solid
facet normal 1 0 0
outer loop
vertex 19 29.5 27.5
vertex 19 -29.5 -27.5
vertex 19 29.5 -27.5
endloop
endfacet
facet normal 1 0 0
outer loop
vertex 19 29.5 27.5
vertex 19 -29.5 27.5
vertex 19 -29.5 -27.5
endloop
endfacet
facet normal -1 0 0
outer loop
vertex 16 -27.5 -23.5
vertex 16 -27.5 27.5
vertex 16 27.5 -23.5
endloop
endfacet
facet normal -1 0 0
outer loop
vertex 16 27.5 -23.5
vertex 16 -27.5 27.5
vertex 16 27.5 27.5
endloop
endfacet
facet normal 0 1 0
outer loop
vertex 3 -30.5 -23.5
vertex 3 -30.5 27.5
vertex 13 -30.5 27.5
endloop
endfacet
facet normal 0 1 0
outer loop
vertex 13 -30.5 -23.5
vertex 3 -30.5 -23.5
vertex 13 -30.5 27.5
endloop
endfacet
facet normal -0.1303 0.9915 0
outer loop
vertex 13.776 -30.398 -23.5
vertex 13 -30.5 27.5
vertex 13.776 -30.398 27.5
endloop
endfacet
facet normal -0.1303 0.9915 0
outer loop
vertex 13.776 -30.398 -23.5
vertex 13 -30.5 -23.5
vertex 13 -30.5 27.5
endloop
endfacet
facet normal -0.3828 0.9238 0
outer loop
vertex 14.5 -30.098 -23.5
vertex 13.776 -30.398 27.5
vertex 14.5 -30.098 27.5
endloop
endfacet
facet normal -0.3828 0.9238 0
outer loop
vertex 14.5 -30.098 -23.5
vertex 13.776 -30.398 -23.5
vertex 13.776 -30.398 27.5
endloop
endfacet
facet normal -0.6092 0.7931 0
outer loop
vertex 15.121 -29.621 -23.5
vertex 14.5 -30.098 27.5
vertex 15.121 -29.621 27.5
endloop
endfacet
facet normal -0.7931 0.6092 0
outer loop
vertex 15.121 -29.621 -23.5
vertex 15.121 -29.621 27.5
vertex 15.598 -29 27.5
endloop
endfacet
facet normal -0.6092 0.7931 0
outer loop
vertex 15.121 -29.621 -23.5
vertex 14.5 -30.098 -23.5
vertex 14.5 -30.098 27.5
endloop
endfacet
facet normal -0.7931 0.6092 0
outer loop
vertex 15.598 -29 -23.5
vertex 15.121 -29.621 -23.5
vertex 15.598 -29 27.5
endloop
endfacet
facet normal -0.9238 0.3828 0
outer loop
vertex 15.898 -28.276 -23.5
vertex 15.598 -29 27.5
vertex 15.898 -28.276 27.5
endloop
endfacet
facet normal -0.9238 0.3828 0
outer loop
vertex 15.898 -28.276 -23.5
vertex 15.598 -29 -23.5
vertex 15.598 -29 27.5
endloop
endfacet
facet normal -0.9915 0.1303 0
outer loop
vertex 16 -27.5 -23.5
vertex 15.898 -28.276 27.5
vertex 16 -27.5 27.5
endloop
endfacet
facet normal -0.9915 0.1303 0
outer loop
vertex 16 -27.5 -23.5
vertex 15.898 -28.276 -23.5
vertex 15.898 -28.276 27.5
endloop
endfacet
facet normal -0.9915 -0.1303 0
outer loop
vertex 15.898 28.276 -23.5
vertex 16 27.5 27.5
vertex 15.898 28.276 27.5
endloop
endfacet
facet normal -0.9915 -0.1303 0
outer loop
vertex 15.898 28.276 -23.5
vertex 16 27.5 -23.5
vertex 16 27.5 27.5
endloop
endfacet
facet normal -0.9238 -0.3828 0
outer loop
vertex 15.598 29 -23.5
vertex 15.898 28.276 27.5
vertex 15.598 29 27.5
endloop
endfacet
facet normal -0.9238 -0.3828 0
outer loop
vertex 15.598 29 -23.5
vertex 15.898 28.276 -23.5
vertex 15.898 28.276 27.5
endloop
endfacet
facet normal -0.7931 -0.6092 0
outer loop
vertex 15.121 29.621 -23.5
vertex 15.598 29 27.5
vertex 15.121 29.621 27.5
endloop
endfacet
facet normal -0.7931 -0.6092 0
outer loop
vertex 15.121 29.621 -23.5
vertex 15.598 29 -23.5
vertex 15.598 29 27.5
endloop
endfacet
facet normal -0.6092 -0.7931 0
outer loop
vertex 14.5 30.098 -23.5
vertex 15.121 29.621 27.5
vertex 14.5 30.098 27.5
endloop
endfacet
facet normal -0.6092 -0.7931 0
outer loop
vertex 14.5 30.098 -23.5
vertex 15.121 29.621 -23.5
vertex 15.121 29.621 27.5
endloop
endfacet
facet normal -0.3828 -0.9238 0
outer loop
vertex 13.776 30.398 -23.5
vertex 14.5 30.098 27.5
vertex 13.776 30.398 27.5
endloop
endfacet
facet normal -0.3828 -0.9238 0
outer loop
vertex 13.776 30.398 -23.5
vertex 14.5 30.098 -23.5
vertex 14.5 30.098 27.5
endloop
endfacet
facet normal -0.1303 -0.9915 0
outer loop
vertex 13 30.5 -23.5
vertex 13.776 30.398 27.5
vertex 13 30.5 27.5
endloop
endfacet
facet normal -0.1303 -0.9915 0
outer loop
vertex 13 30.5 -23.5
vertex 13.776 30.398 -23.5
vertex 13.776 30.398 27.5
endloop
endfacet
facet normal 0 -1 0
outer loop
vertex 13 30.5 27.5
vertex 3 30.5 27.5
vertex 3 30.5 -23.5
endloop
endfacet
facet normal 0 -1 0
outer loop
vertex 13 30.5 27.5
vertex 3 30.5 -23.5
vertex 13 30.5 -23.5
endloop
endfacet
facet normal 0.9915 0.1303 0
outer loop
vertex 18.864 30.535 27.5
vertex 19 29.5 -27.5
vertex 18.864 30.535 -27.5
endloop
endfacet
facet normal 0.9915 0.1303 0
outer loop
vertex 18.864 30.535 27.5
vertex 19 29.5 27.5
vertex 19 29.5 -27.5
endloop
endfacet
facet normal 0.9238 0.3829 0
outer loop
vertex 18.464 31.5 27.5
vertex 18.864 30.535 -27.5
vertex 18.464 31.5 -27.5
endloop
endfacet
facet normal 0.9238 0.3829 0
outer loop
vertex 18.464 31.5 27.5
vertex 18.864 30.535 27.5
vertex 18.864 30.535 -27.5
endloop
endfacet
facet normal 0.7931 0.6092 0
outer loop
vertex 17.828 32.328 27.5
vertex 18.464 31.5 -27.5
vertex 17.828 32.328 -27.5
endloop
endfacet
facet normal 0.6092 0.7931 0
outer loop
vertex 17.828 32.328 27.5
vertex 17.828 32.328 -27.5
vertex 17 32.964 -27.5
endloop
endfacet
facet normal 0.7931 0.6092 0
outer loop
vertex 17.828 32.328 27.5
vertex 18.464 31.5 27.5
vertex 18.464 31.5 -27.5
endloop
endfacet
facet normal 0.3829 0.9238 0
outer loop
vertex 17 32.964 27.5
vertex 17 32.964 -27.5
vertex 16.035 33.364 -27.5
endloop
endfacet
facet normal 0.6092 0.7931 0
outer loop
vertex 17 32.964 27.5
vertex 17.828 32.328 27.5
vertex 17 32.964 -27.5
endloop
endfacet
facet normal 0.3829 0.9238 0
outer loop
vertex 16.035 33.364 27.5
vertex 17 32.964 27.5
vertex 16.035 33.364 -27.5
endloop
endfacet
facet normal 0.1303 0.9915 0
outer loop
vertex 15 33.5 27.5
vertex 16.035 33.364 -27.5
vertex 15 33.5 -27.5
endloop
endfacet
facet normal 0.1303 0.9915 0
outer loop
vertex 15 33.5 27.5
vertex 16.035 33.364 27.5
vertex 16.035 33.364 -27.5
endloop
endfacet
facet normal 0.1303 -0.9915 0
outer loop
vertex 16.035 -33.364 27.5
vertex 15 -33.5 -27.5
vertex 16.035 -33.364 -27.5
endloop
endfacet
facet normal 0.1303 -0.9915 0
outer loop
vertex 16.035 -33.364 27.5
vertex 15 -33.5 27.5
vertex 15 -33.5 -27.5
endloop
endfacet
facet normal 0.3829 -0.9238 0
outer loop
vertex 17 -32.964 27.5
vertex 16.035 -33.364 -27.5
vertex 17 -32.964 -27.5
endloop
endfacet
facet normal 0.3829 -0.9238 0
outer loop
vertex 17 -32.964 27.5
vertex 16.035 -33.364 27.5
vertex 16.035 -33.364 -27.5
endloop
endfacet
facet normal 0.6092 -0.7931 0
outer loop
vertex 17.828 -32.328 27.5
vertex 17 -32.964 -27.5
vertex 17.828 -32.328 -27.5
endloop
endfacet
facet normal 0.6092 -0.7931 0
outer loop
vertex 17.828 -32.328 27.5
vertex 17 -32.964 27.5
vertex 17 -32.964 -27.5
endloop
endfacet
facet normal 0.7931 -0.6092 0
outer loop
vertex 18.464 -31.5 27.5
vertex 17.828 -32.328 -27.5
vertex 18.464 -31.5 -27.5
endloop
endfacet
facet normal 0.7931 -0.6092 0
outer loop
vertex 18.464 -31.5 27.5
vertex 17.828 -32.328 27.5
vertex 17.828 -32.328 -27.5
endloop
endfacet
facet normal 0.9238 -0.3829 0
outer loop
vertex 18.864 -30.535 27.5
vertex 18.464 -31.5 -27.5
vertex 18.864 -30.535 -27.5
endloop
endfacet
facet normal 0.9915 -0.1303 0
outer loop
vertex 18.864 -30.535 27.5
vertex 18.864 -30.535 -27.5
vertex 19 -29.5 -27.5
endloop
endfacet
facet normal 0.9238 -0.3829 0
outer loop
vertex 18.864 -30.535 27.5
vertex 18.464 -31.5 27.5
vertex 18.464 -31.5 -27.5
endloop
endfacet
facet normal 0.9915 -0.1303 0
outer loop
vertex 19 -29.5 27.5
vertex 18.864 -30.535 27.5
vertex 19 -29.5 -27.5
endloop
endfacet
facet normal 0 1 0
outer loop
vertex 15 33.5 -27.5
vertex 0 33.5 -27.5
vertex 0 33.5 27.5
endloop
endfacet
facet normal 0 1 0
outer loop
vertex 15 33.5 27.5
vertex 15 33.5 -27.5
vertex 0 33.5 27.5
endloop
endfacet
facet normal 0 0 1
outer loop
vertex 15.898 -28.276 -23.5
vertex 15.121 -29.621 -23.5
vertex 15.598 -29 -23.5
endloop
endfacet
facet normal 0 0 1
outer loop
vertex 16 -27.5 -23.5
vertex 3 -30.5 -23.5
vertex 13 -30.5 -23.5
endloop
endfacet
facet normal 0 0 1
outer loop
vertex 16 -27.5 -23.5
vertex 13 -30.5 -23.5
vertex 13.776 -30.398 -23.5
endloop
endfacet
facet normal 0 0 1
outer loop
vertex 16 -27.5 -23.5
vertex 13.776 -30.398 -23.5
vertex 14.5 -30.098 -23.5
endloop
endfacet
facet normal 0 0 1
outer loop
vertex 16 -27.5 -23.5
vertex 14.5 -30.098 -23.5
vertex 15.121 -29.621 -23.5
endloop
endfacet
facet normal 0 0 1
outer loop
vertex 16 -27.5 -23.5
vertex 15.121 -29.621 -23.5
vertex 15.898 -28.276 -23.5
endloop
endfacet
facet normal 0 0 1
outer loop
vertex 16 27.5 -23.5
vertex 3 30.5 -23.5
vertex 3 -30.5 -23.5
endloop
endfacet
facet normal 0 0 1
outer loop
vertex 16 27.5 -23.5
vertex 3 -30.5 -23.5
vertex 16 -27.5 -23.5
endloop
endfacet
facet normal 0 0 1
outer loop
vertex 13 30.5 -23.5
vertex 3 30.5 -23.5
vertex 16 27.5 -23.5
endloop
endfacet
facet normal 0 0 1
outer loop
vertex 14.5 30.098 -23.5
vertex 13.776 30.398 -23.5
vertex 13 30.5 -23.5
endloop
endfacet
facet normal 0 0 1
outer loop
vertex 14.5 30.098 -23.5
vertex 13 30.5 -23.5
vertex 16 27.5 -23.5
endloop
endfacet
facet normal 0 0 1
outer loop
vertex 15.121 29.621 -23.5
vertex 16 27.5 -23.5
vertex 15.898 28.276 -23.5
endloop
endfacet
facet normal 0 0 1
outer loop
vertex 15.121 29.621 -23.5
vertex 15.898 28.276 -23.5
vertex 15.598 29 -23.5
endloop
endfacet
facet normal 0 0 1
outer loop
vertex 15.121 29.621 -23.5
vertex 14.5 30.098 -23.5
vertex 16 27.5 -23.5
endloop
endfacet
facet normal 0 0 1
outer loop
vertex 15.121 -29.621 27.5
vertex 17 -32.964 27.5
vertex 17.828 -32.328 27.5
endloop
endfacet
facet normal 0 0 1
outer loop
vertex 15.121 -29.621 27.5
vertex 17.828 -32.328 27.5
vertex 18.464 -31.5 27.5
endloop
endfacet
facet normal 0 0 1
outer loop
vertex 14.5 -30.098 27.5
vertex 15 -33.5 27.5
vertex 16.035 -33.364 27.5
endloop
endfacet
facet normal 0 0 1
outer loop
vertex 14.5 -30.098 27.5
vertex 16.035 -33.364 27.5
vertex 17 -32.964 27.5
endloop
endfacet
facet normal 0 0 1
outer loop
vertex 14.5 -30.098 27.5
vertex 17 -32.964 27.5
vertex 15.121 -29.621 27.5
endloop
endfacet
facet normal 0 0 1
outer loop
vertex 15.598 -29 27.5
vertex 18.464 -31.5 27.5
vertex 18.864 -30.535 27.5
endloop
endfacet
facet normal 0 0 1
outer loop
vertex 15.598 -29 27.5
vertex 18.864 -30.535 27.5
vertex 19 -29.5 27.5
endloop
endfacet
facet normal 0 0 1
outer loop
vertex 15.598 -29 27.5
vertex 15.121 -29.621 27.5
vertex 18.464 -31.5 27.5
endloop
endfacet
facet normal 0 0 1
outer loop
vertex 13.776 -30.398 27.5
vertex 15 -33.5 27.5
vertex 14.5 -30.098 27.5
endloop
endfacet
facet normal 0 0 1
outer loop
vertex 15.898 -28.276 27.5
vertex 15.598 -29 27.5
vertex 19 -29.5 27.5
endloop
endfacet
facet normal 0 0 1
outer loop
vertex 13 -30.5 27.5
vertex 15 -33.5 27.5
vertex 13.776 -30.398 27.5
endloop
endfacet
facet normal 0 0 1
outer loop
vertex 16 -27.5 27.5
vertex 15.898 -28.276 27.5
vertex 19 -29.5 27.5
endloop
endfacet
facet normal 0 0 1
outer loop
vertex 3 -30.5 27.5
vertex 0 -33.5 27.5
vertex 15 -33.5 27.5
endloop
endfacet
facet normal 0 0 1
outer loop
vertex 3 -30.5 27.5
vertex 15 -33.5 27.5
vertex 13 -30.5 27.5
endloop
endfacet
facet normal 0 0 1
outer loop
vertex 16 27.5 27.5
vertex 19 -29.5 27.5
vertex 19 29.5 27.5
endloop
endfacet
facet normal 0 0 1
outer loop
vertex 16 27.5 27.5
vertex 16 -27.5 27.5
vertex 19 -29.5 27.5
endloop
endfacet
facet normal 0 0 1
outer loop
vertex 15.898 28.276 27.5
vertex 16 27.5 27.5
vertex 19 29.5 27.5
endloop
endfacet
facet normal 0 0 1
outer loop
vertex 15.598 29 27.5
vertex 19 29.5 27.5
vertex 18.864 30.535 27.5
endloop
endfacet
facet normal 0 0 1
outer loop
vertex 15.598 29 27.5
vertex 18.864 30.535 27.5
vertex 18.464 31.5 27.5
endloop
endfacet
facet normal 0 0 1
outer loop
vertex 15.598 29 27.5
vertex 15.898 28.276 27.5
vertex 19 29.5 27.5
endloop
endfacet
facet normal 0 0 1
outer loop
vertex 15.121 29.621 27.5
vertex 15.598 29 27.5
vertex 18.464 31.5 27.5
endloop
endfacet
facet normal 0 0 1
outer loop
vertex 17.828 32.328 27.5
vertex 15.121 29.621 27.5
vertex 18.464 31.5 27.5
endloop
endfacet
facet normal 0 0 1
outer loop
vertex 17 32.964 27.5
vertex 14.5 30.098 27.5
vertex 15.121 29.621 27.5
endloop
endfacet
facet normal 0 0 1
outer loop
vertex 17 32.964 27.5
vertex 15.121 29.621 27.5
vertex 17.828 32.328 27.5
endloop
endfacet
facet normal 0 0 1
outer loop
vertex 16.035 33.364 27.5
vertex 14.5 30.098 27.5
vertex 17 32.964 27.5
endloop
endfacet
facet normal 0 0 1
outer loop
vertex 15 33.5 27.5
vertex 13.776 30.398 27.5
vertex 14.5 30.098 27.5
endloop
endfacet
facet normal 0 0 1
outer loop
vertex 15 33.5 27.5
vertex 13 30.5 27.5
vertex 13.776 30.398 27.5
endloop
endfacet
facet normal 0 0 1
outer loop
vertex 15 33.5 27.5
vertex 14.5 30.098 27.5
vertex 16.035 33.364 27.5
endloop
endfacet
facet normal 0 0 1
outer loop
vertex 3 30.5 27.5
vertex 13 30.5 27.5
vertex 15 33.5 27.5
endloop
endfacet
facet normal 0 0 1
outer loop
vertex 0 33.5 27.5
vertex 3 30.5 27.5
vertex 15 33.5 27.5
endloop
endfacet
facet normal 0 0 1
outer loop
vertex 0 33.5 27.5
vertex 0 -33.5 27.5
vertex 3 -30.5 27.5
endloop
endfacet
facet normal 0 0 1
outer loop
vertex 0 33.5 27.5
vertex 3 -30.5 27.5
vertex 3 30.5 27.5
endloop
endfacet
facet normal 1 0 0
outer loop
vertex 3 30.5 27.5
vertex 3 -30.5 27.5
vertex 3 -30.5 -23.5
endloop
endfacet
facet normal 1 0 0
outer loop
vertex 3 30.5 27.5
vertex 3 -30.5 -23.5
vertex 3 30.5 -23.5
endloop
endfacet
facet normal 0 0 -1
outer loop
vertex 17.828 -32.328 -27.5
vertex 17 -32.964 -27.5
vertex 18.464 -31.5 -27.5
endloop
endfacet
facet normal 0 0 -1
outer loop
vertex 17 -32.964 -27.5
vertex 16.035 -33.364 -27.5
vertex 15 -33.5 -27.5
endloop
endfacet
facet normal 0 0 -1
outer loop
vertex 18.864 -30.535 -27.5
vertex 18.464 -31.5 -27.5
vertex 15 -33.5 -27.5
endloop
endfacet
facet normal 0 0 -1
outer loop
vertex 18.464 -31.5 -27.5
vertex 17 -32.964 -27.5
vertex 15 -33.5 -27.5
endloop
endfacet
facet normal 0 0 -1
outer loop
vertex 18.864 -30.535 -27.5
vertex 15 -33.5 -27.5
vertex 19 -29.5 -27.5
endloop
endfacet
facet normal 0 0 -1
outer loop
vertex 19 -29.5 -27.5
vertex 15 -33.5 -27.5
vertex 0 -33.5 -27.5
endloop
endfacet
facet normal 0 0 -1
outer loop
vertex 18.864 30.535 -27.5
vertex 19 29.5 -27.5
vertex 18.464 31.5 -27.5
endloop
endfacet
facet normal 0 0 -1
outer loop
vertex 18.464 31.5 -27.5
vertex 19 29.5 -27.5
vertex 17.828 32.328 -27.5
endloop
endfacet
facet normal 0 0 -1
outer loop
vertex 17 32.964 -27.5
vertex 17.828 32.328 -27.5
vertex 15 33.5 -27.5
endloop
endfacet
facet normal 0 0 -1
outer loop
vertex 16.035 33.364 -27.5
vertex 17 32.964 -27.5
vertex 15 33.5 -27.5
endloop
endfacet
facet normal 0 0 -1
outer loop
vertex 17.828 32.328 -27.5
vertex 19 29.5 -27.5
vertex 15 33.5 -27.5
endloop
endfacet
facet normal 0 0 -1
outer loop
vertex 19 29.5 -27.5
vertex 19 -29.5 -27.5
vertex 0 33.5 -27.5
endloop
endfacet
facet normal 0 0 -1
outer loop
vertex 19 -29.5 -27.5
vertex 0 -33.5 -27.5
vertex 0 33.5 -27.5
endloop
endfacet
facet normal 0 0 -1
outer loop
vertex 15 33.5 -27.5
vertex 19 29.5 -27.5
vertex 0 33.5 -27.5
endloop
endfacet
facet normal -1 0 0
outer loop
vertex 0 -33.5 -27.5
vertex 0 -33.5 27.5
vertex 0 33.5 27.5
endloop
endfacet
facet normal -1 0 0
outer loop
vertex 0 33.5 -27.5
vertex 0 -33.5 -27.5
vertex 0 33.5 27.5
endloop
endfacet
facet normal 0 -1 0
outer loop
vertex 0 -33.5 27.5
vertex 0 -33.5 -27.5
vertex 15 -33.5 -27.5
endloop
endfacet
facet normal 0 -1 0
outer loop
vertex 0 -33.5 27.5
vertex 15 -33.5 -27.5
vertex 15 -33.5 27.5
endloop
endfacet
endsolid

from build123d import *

# Parameters (mm, degrees)
SKETCH1_W           = 67
SKETCH1_H           = 55
BOSS_EXTRUDE1_DEPTH = 19
SKETCH3_W           = 13
SKETCH3_H           = 61
CUT_EXTRUDE1_DEPTH  = 51
FILLET1_R           = 4
FILLET2_R           = 3


with BuildPart() as part:
    # Sketch1 → Boss-Extrude1 (new body)
    with BuildSketch(Plane.YZ):
        Rectangle(SKETCH1_W, SKETCH1_H)
    extrude(amount=BOSS_EXTRUDE1_DEPTH)

    # Sketch3 → Cut-Extrude1 (cut)
    with BuildSketch(Plane.XY.offset(27.5)):
        with Locations((9.5, 0)):
            Rectangle(SKETCH3_W, SKETCH3_H)
    extrude(amount=-CUT_EXTRUDE1_DEPTH, mode=Mode.SUBTRACT)

    # Fillet1
    fillet1_edges = [part.edges().sort_by_distance(p)[0] for p in [
        (19, -33.5, 0),
        (19, 33.5, 0),
    ]]
    fillet(fillet1_edges, radius=FILLET1_R)

    # Fillet2
    fillet2_edges = [part.edges().sort_by_distance(p)[0] for p in [
        (16, 30.5, 2),
        (16, -30.5, 2),
    ]]
    fillet(fillet2_edges, radius=FILLET2_R)


solid = part.part
